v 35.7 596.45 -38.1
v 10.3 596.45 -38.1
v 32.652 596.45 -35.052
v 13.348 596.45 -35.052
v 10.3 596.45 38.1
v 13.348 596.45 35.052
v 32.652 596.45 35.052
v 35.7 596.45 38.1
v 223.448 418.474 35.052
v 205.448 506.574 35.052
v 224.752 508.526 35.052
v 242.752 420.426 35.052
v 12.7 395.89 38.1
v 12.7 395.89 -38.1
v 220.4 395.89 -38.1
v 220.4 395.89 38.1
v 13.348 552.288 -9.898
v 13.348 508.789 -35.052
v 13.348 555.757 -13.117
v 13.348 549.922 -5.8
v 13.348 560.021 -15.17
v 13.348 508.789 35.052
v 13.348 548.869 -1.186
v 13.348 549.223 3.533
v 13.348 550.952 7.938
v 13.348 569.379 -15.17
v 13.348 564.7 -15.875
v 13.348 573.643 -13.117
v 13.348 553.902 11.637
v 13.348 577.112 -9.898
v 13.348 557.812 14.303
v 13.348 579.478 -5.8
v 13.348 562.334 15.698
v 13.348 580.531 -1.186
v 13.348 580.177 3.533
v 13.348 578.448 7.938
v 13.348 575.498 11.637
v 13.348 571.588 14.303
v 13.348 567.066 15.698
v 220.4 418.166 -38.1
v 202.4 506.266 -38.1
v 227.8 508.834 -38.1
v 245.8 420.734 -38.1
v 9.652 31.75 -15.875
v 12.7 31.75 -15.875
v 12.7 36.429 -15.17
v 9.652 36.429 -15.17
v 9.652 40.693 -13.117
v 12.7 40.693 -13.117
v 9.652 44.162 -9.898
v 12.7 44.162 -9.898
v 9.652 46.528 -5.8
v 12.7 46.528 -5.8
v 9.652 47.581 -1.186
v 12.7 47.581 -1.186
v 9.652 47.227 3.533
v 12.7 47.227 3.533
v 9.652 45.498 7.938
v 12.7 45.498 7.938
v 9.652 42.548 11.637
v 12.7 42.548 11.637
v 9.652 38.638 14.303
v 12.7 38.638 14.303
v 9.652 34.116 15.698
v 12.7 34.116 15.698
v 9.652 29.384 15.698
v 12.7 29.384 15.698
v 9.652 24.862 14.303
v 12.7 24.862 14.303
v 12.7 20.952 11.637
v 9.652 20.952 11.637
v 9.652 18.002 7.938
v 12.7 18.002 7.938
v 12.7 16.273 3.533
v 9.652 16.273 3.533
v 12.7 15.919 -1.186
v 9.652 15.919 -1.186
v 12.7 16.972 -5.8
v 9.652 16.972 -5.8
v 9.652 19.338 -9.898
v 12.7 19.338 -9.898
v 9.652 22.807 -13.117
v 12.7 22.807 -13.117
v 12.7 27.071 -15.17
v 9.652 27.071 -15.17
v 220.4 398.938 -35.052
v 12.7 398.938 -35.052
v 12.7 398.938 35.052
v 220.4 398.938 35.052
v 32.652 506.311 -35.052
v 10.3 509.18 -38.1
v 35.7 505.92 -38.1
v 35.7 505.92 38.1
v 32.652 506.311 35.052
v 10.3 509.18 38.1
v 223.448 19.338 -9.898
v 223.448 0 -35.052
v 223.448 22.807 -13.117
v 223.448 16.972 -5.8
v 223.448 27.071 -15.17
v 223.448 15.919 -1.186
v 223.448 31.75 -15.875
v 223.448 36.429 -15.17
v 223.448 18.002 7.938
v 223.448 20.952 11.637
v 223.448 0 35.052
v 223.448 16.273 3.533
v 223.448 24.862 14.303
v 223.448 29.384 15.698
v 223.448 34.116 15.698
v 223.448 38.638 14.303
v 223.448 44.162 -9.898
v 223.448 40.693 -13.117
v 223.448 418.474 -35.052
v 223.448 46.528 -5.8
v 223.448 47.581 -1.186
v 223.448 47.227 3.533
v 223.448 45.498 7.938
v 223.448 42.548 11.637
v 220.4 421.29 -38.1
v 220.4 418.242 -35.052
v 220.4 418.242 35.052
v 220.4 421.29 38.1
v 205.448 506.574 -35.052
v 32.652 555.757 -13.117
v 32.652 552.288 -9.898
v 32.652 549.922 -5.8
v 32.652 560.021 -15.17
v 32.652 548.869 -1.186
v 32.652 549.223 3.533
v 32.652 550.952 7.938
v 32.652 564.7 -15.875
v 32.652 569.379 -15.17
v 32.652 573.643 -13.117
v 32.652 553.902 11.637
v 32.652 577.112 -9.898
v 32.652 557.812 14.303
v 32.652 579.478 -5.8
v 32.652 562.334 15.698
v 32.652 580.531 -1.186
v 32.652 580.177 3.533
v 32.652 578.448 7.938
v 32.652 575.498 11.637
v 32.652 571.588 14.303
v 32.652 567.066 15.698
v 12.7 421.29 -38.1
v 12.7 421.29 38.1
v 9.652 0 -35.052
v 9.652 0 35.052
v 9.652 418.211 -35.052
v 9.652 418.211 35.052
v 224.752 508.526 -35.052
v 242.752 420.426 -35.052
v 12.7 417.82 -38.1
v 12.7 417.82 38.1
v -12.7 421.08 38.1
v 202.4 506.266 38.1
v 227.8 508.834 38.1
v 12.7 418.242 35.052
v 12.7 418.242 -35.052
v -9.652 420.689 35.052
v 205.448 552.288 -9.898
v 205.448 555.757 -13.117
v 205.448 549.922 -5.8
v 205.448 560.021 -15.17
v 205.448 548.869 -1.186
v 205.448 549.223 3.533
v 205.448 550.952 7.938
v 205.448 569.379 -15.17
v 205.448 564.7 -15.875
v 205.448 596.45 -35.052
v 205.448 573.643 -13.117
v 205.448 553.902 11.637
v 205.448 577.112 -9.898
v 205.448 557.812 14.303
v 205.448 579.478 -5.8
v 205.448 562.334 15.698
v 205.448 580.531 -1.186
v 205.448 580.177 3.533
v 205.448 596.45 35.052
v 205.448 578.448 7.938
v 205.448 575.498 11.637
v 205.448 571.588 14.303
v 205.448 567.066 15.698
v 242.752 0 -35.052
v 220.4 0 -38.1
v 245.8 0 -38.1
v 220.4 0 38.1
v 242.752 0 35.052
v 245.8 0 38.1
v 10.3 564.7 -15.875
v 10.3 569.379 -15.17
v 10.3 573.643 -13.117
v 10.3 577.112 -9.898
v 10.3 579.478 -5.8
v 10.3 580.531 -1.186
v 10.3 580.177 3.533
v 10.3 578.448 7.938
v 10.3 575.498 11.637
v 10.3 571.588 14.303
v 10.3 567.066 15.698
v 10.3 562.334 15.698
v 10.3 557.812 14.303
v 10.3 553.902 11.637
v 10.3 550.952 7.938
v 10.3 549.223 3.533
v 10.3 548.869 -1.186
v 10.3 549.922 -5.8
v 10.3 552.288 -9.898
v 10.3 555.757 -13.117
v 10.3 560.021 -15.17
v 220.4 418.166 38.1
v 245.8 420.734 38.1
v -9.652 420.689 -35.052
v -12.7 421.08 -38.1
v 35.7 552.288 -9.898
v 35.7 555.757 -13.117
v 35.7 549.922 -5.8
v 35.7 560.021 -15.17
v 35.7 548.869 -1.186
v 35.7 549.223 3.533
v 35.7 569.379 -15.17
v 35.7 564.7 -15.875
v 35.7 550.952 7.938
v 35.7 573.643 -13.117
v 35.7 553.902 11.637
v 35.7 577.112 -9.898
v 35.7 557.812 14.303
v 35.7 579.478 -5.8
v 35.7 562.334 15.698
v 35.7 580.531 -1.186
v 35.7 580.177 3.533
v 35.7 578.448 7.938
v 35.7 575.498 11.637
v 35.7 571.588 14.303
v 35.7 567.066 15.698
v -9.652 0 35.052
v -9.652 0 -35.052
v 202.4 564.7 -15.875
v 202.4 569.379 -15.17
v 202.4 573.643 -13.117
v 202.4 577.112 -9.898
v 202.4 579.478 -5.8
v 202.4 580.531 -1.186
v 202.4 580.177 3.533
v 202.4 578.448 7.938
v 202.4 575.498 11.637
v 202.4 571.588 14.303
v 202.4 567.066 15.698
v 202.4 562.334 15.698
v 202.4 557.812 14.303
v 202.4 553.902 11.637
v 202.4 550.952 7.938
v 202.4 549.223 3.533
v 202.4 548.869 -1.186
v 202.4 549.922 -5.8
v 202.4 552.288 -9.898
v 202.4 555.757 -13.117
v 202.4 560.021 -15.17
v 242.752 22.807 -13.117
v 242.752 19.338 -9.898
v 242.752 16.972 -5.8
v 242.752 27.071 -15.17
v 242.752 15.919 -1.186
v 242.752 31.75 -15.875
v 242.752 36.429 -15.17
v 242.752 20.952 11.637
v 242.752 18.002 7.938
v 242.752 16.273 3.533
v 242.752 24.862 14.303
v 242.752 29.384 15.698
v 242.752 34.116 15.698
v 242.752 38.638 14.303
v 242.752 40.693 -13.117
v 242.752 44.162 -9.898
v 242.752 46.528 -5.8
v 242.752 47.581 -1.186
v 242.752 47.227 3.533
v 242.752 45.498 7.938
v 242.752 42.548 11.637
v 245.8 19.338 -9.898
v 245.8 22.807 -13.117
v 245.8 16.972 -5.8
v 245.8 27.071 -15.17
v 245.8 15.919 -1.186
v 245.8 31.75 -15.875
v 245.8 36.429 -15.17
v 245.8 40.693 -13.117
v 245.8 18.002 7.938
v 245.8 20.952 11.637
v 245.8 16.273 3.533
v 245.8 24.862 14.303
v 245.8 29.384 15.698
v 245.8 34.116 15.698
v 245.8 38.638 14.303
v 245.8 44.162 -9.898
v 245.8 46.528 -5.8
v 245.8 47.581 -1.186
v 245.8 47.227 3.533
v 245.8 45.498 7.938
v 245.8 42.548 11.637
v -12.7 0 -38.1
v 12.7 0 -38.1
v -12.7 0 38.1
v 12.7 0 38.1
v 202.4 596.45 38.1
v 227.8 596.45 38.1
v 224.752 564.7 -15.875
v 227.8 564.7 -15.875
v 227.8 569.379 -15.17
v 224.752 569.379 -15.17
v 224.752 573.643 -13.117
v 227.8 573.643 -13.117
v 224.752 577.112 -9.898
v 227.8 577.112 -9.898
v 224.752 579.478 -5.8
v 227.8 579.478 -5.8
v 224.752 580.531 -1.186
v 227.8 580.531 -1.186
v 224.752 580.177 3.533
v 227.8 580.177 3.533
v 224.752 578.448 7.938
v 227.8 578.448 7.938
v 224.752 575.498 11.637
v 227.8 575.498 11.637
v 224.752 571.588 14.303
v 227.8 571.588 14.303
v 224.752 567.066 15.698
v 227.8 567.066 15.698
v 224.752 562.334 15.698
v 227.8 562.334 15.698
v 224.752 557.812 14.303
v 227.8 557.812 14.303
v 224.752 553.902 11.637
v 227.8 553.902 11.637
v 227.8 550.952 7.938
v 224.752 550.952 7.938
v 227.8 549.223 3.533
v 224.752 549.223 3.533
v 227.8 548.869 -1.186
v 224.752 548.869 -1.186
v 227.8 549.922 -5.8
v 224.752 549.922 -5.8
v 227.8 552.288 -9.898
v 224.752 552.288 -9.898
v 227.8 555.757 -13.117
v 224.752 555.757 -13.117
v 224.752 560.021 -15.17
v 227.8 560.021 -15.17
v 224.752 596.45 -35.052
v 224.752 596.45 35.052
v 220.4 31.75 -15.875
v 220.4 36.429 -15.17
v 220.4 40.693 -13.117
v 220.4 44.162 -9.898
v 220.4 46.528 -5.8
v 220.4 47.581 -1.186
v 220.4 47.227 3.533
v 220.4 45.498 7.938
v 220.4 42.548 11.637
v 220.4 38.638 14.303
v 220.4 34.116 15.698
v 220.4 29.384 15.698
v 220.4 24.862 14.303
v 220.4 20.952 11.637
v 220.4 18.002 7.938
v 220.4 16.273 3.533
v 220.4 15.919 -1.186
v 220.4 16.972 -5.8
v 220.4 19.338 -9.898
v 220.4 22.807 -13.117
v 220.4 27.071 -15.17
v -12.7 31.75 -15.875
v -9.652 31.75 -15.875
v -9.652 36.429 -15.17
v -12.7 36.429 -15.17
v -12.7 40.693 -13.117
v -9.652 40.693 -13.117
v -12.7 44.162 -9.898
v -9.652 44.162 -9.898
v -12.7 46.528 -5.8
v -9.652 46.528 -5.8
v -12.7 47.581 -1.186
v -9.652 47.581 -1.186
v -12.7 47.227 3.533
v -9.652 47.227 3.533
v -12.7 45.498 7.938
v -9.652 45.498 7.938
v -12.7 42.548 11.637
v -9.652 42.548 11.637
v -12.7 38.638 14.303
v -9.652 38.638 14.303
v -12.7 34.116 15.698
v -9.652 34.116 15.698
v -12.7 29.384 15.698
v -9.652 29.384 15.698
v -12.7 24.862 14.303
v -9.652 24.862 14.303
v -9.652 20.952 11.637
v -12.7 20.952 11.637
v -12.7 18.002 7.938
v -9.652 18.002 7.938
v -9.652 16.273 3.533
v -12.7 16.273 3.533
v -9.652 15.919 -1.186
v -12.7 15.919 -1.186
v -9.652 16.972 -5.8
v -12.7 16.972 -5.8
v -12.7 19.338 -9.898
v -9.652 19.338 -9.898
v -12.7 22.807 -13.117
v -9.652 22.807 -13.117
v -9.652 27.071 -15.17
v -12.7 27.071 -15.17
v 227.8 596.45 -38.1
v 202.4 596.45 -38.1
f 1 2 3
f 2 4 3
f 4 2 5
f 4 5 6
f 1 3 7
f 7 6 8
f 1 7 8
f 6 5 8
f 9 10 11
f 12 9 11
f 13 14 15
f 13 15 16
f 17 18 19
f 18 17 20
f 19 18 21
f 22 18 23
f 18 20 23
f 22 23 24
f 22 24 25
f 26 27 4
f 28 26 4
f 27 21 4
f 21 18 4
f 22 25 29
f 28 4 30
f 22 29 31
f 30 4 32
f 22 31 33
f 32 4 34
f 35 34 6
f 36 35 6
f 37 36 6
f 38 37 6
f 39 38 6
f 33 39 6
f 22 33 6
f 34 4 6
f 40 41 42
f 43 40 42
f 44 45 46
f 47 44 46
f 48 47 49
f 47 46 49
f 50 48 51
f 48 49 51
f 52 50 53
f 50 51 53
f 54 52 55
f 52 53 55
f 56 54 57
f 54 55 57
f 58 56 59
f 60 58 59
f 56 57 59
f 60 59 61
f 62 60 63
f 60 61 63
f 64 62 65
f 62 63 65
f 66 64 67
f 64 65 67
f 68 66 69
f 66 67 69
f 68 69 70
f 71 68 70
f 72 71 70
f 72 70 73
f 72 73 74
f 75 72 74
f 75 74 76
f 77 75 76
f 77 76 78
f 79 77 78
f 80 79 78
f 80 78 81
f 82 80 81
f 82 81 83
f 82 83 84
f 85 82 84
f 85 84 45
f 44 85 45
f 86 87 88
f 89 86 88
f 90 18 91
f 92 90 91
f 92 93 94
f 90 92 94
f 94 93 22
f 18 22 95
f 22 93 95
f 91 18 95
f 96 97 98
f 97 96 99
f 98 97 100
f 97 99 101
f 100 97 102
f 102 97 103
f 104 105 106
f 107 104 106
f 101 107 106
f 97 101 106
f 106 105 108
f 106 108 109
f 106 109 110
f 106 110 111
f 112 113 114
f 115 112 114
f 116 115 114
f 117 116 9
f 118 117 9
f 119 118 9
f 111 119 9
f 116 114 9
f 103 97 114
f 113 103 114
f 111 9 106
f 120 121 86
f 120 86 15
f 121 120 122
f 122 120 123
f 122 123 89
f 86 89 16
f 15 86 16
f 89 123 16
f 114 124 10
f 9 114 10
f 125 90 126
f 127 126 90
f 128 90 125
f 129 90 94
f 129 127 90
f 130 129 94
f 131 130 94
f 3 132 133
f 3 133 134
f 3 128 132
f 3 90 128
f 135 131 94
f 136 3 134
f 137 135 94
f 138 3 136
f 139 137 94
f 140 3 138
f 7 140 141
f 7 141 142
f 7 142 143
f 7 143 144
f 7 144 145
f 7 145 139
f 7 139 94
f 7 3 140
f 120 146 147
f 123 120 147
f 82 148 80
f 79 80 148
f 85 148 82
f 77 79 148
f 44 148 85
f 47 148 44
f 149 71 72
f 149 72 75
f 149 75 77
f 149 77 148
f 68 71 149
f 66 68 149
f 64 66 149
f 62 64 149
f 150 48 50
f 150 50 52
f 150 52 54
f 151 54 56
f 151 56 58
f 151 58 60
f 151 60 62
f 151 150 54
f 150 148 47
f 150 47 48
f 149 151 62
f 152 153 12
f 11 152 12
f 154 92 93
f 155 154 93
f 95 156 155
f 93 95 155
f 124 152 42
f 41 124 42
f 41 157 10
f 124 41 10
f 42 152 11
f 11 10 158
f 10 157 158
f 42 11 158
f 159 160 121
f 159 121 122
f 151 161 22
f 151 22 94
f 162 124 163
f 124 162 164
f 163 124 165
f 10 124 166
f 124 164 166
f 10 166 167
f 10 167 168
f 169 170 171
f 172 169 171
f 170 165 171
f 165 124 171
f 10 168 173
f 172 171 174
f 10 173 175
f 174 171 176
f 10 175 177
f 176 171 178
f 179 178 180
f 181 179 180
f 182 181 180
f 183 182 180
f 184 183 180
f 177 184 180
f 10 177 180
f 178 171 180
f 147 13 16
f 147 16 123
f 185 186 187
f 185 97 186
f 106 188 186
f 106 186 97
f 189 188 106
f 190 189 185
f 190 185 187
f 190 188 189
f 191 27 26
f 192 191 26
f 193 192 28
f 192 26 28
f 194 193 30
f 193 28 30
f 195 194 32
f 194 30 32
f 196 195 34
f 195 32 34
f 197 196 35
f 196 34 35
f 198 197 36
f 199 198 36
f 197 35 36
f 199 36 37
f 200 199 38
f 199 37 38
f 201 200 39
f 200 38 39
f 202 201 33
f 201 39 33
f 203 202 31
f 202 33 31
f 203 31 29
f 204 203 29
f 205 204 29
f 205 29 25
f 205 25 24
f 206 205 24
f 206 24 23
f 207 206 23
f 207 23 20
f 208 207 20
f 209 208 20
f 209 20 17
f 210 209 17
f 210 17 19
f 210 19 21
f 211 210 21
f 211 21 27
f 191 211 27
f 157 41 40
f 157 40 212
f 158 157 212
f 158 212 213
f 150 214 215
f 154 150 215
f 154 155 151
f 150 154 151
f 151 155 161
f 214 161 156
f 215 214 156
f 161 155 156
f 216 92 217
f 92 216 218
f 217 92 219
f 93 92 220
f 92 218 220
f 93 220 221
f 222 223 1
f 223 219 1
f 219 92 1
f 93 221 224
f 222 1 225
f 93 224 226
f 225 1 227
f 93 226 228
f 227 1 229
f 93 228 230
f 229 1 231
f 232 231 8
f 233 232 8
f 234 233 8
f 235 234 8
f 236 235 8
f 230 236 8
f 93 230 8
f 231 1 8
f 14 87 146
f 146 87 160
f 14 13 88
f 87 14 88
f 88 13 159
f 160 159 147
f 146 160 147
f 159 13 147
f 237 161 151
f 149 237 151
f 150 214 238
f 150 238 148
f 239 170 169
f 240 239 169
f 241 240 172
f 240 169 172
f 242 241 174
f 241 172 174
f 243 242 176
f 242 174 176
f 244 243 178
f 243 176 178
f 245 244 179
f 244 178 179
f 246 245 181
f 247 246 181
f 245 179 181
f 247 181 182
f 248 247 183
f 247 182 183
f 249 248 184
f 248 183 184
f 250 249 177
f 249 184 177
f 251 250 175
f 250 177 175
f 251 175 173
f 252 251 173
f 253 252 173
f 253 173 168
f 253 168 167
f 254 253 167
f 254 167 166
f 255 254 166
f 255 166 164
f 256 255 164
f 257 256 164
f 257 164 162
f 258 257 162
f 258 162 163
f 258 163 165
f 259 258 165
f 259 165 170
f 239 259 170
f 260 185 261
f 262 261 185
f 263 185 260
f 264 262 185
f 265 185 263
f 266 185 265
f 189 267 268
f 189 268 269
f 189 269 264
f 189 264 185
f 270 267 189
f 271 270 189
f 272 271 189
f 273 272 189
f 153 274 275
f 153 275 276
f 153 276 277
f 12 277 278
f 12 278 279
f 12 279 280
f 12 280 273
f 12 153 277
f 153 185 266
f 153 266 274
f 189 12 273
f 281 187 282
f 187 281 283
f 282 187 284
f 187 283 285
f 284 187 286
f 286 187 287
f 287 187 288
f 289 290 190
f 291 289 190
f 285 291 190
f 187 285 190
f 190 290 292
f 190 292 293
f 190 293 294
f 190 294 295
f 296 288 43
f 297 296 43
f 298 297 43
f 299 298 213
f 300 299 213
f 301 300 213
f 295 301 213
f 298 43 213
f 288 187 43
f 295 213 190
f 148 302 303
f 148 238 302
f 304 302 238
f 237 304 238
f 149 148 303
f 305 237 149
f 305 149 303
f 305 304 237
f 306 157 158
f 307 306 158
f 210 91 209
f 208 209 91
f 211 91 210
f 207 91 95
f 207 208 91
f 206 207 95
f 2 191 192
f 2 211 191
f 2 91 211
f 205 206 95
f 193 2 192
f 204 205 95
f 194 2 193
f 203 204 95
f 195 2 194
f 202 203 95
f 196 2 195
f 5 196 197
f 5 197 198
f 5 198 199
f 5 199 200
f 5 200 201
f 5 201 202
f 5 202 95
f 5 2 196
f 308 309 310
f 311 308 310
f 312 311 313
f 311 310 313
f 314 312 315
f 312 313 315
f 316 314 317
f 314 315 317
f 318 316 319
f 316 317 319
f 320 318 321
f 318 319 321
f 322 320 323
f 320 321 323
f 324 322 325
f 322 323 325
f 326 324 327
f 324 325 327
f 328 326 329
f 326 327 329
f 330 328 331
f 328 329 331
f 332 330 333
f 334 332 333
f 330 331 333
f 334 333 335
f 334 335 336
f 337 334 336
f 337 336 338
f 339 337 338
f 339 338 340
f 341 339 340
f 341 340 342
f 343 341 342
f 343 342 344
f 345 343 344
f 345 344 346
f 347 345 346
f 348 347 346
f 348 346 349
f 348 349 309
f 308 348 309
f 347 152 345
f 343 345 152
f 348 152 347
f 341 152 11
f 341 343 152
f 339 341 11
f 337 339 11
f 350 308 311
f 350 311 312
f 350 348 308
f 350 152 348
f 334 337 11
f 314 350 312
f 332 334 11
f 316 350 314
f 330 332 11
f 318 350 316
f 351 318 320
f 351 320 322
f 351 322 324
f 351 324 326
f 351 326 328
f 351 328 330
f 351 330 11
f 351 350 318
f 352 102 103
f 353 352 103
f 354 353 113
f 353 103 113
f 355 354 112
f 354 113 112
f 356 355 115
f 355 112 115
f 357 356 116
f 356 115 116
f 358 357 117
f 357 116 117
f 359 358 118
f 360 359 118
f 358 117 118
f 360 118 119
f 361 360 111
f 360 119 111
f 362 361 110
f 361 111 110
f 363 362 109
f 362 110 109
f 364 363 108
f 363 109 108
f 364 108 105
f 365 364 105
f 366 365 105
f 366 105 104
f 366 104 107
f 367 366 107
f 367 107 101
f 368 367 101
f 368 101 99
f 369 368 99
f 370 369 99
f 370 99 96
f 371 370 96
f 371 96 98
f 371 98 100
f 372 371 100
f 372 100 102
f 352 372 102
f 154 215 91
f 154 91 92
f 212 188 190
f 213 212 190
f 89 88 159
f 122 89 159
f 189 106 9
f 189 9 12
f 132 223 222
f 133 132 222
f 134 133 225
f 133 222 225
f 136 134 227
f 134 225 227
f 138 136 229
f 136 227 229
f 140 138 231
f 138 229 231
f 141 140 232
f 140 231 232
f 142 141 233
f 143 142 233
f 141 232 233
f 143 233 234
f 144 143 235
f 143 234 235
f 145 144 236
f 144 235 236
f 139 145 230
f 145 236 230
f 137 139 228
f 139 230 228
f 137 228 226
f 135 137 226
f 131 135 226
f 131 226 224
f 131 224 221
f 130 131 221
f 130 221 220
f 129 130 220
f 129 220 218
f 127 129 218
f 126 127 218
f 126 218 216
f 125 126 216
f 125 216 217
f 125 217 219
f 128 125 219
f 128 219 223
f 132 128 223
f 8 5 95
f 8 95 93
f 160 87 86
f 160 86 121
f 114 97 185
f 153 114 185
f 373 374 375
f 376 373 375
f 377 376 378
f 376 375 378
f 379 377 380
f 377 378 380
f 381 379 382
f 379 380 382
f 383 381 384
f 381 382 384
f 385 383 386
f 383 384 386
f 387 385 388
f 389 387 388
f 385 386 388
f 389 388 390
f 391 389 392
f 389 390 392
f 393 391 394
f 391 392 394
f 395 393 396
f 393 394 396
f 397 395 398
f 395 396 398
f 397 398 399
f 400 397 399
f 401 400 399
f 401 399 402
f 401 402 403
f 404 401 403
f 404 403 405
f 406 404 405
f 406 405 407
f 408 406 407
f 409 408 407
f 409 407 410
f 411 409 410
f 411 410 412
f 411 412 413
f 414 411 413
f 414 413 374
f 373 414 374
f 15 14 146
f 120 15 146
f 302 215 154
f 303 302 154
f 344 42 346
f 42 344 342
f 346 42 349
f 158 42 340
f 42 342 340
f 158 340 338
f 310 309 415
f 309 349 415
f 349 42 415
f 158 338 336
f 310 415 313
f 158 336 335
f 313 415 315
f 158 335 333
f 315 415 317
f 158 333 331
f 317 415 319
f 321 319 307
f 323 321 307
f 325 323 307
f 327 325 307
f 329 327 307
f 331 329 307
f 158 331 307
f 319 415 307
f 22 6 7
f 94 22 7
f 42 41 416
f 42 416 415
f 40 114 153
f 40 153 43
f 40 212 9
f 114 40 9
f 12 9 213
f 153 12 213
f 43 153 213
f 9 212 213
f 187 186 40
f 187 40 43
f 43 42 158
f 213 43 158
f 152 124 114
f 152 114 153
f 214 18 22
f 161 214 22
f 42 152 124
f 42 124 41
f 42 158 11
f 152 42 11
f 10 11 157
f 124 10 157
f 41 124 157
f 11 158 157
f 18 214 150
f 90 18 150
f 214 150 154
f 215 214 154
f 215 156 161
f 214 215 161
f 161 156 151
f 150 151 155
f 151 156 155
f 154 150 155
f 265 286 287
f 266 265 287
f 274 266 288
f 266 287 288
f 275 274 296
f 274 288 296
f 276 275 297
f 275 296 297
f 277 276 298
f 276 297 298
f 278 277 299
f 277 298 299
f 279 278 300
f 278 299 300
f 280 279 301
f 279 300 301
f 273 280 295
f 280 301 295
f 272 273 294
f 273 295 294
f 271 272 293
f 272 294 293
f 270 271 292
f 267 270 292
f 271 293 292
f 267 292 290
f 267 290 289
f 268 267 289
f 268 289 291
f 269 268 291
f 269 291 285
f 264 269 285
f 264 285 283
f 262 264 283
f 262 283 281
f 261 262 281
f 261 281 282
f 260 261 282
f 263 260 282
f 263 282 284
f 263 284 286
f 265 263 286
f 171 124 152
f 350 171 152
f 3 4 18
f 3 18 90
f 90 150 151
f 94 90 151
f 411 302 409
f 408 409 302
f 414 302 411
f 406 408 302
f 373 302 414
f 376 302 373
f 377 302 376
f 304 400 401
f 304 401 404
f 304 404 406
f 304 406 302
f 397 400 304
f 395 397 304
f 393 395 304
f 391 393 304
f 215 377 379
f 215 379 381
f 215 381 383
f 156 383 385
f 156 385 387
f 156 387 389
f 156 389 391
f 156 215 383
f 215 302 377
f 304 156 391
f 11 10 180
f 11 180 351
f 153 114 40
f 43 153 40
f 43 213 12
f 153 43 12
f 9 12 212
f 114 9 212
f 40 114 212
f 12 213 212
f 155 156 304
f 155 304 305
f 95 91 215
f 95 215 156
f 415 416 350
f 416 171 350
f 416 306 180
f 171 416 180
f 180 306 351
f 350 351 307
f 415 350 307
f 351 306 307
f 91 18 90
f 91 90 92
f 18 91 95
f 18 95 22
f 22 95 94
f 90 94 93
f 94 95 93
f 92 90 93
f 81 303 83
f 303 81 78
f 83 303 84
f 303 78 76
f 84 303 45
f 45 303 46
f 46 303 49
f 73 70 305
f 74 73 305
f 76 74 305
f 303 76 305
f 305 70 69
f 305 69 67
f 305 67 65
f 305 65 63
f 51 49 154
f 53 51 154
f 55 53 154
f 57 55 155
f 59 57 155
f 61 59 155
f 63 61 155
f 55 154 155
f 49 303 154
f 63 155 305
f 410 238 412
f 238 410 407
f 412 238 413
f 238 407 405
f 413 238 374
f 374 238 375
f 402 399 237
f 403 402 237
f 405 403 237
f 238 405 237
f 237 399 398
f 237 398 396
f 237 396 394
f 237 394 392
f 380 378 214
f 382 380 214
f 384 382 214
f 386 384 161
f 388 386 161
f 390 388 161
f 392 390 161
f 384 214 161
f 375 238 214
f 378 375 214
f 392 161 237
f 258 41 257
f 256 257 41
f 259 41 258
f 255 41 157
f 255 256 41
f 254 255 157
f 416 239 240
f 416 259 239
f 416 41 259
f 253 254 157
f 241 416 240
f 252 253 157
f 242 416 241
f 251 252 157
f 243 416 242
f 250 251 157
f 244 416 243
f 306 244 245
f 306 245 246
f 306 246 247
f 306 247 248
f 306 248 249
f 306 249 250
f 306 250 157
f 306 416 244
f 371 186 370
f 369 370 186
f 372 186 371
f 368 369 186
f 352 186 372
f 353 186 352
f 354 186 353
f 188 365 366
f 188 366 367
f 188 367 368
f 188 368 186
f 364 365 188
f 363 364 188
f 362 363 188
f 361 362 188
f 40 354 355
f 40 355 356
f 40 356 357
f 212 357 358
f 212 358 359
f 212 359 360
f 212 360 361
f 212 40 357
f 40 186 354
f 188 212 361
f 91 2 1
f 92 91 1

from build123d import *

# Parameters (mm, degrees)
SKETCH1_W                = 25.4
SKETCH1_H                = 76.2
SKETCH1_W_2              = 19.304
SKETCH1_H_2              = 70.104
STEEL_3X1_1_DEPTH        = 93.960760543
SKETCH1_ON_SEGMENT_2_W   = 25.4
SKETCH1_ON_SEGMENT_2_H   = 76.2
SKETCH1_ON_SEGMENT_2_W_2 = 19.304
SKETCH1_ON_SEGMENT_2_H_2 = 70.104
STEEL_3X1_1_2_DEPTH      = 100.041541103
SKETCH1_ON_SEGMENT_3_W   = 25.4
SKETCH1_ON_SEGMENT_3_H   = 76.2
SKETCH1_ON_SEGMENT_3_W_2 = 19.304
SKETCH1_ON_SEGMENT_3_H_2 = 70.104
STEEL_3X1_1_3_DEPTH      = 424.510760543
SKETCH1_ON_SEGMENT_4_W   = 25.4
SKETCH1_ON_SEGMENT_4_H   = 76.2
SKETCH1_ON_SEGMENT_4_W_2 = 19.304
SKETCH1_ON_SEGMENT_4_H_2 = 70.104
STEEL_3X1_1_4_DEPTH      = 95.055941588
SKETCH1_ON_SEGMENT_5_W   = 25.4
SKETCH1_ON_SEGMENT_5_H   = 76.2
SKETCH1_ON_SEGMENT_5_W_2 = 19.304
SKETCH1_ON_SEGMENT_5_H_2 = 70.104
STEEL_3X1_1_5_DEPTH      = 103.364670064
SKETCH1_ON_SEGMENT_6_W   = 25.4
SKETCH1_ON_SEGMENT_6_H   = 76.2
SKETCH1_ON_SEGMENT_6_W_2 = 19.304
SKETCH1_ON_SEGMENT_6_H_2 = 70.104
STEEL_3X1_1_6_DEPTH      = 425.605941588
SKETCH1_ON_SEGMENT_7_W   = 25.4
SKETCH1_ON_SEGMENT_7_H   = 76.2
SKETCH1_ON_SEGMENT_7_W_2 = 19.304
SKETCH1_ON_SEGMENT_7_H_2 = 70.104
STEEL_3X1_1_7_DEPTH      = 235.1
SKETCH3_R                = 15.875
CUT_EXTRUDE1_DEPTH       = 652.173143258
SKETCH4_R                = 15.875
CUT_EXTRUDE2_DEPTH       = 645.239445005


with BuildPart() as part:
    # Sketch1 → Steel 3X1(1) (new body)
    with BuildSketch(Plane(origin=(215.1, 596.45, 0), x_dir=(1, 0, 0), z_dir=(0, -1, 0))):
        Rectangle(SKETCH1_W, SKETCH1_H)
        Rectangle(SKETCH1_W_2, SKETCH1_H_2, mode=Mode.SUBTRACT)
    extrude(amount=STEEL_3X1_1_DEPTH)

    # Steel 3X1(1) mitre 1
    split(bisect_by=Plane(origin=(215.1, 507.55, 0), x_dir=(-0.994927025, -0.100599283, 0), z_dir=(-0.100599283, 0.994927025, 0)), keep=Keep.TOP)


with BuildPart() as body_2:
    # Sketch1 on segment 2 (carried to segment 2) → Steel 3X1_1 2 (new body)
    with BuildSketch(Plane(origin=(214.086947626, 512.508328565, 0), x_dir=(0.979759568, 0.200177891, 0), z_dir=(0.200177891, -0.979759568, 0))):
        Rectangle(SKETCH1_ON_SEGMENT_2_W, SKETCH1_ON_SEGMENT_2_H)
        Rectangle(SKETCH1_ON_SEGMENT_2_W_2, SKETCH1_ON_SEGMENT_2_H_2, mode=Mode.SUBTRACT)
    extrude(amount=STEEL_3X1_1_2_DEPTH)

    # Steel 3X1_1 2 mitre 1
    split(bisect_by=Plane(origin=(215.1, 507.55, 0), x_dir=(0.994927025, 0.100599283, 0), z_dir=(0.100599283, -0.994927025, 0)), keep=Keep.TOP)

    # Steel 3X1_1 2 mitre 2
    split(bisect_by=Plane(origin=(233.1, 419.45, 0), x_dir=(-0.994927025, -0.100599283, 0), z_dir=(-0.100599283, 0.994927025, 0)), keep=Keep.TOP)


with BuildPart() as body_3:
    # Sketch1 on segment 3 (carried to segment 3) → Steel 3X1_1 3 (new body)
    with BuildSketch(Plane(origin=(233.1, 424.510760543, 0), x_dir=(1, 0, 0), z_dir=(0, -1, 0))):
        Rectangle(SKETCH1_ON_SEGMENT_3_W, SKETCH1_ON_SEGMENT_3_H)
        Rectangle(SKETCH1_ON_SEGMENT_3_W_2, SKETCH1_ON_SEGMENT_3_H_2, mode=Mode.SUBTRACT)
    extrude(amount=STEEL_3X1_1_3_DEPTH)

    # Steel 3X1_1 3 mitre 1
    split(bisect_by=Plane(origin=(233.1, 419.45, 0), x_dir=(0.994927025, 0.100599283, 0), z_dir=(0.100599283, -0.994927025, 0)), keep=Keep.TOP)


with BuildPart() as body_4:
    # Sketch1 on segment 4 (carried to segment 4) → Steel 3X1_1 4 (new body)
    with BuildSketch(Plane(origin=(23, 596.45, 0), x_dir=(1, 0, 0), z_dir=(0, -1, 0))):
        Rectangle(SKETCH1_ON_SEGMENT_4_W, SKETCH1_ON_SEGMENT_4_H)
        Rectangle(SKETCH1_ON_SEGMENT_4_W_2, SKETCH1_ON_SEGMENT_4_H_2, mode=Mode.SUBTRACT)
    extrude(amount=STEEL_3X1_1_4_DEPTH)

    # Steel 3X1_1 4 mitre 1
    split(bisect_by=Plane(origin=(23, 507.55, 0), x_dir=(-0.991859517, 0.127336947, 0), z_dir=(0.127336947, 0.991859517, 0)), keep=Keep.TOP)


with BuildPart() as body_5:
    # Sketch1 on segment 5 (carried to segment 5) → Steel 3X1_1 5 (new body)
    with BuildSketch(Plane(origin=(24.554995309, 513.50630812, 0), x_dir=(0.967570604, -0.252600725, 0), z_dir=(-0.252600725, -0.967570604, 0))):
        Rectangle(SKETCH1_ON_SEGMENT_5_W, SKETCH1_ON_SEGMENT_5_H)
        Rectangle(SKETCH1_ON_SEGMENT_5_W_2, SKETCH1_ON_SEGMENT_5_H_2, mode=Mode.SUBTRACT)
    extrude(amount=STEEL_3X1_1_5_DEPTH)

    # Steel 3X1_1 5 mitre 1
    split(bisect_by=Plane(origin=(23, 507.55, 0), x_dir=(0.991859517, -0.127336947, 0), z_dir=(-0.127336947, -0.991859517, 0)), keep=Keep.TOP)

    # Steel 3X1_1 5 mitre 2
    split(bisect_by=Plane(origin=(0, 419.45, 0), x_dir=(-0.991859517, 0.127336947, 0), z_dir=(0.127336947, 0.991859517, 0)), keep=Keep.TOP)


with BuildPart() as body_6:
    # Sketch1 on segment 6 (carried to segment 6) → Steel 3X1_1 6 (new body)
    with BuildSketch(Plane.XZ.offset(-425.605941588)):
        Rectangle(SKETCH1_ON_SEGMENT_6_W, SKETCH1_ON_SEGMENT_6_H)
        Rectangle(SKETCH1_ON_SEGMENT_6_W_2, SKETCH1_ON_SEGMENT_6_H_2, mode=Mode.SUBTRACT)
    extrude(amount=STEEL_3X1_1_6_DEPTH)

    # Steel 3X1_1 6 mitre 1
    split(bisect_by=Plane(origin=(0, 419.45, 0), x_dir=(0.991859517, -0.127336947, 0), z_dir=(-0.127336947, -0.991859517, 0)), keep=Keep.TOP)


with BuildPart() as body_7:
    # Sketch1 on segment 7 (carried to segment 7) → Steel 3X1_1 7 (new body)
    with BuildSketch(Plane(origin=(-1, 408.59, 0), x_dir=(0, 1, 0), z_dir=(1, 0, 0))):
        Rectangle(SKETCH1_ON_SEGMENT_7_W, SKETCH1_ON_SEGMENT_7_H)
        Rectangle(SKETCH1_ON_SEGMENT_7_W_2, SKETCH1_ON_SEGMENT_7_H_2, mode=Mode.SUBTRACT)
    extrude(amount=STEEL_3X1_1_7_DEPTH)

    # Steel 3X1_1 7 mitre 1
    split(bisect_by=Plane(origin=(12.7, 408.59, 0), x_dir=(0, 1, 0), z_dir=(1, 0, 0)), keep=Keep.TOP)

    # Steel 3X1_1 7 mitre 2
    split(bisect_by=Plane(origin=(220.4, 408.59, 0), x_dir=(0, -1, 0), z_dir=(-1, 0, 0)), keep=Keep.TOP)


with BuildPart() as cut_extrude1_tool:
    # Sketch3 → Cut-Extrude1 (new, through all)
    with BuildSketch(Plane(origin=(245.8, 0, 0), x_dir=(0, 0, -1), z_dir=(1, 0, 0))):
        with Locations((0, 31.75)):
            Circle(SKETCH3_R)
    extrude(amount=-CUT_EXTRUDE1_DEPTH)


with BuildPart() as body_3_1:
    add(body_3.part)

    # Cut-Extrude1: cut by cut_extrude1_tool
    add(cut_extrude1_tool.part, mode=Mode.SUBTRACT)


with BuildPart() as body_6_1:
    add(body_6.part)

    # Cut-Extrude1: cut by cut_extrude1_tool
    add(cut_extrude1_tool.part, mode=Mode.SUBTRACT)


with BuildPart() as cut_extrude2_tool:
    # Sketch4 → Cut-Extrude2 (new, through all)
    with BuildSketch(Plane(origin=(227.8, 0, 0), x_dir=(0, 0, -1), z_dir=(1, 0, 0))):
        with Locations((0, 564.7)):
            Circle(SKETCH4_R)
    extrude(amount=-CUT_EXTRUDE2_DEPTH)


with BuildPart() as part_1:
    add(part.part)

    # Cut-Extrude2: cut by cut_extrude2_tool
    add(cut_extrude2_tool.part, mode=Mode.SUBTRACT)


with BuildPart() as body_4_1:
    add(body_4.part)

    # Cut-Extrude2: cut by cut_extrude2_tool
    add(cut_extrude2_tool.part, mode=Mode.SUBTRACT)


solid = Compound([body_2.part, body_5.part, body_7.part, body_3_1.part, body_6_1.part, part_1.part, body_4_1.part])
